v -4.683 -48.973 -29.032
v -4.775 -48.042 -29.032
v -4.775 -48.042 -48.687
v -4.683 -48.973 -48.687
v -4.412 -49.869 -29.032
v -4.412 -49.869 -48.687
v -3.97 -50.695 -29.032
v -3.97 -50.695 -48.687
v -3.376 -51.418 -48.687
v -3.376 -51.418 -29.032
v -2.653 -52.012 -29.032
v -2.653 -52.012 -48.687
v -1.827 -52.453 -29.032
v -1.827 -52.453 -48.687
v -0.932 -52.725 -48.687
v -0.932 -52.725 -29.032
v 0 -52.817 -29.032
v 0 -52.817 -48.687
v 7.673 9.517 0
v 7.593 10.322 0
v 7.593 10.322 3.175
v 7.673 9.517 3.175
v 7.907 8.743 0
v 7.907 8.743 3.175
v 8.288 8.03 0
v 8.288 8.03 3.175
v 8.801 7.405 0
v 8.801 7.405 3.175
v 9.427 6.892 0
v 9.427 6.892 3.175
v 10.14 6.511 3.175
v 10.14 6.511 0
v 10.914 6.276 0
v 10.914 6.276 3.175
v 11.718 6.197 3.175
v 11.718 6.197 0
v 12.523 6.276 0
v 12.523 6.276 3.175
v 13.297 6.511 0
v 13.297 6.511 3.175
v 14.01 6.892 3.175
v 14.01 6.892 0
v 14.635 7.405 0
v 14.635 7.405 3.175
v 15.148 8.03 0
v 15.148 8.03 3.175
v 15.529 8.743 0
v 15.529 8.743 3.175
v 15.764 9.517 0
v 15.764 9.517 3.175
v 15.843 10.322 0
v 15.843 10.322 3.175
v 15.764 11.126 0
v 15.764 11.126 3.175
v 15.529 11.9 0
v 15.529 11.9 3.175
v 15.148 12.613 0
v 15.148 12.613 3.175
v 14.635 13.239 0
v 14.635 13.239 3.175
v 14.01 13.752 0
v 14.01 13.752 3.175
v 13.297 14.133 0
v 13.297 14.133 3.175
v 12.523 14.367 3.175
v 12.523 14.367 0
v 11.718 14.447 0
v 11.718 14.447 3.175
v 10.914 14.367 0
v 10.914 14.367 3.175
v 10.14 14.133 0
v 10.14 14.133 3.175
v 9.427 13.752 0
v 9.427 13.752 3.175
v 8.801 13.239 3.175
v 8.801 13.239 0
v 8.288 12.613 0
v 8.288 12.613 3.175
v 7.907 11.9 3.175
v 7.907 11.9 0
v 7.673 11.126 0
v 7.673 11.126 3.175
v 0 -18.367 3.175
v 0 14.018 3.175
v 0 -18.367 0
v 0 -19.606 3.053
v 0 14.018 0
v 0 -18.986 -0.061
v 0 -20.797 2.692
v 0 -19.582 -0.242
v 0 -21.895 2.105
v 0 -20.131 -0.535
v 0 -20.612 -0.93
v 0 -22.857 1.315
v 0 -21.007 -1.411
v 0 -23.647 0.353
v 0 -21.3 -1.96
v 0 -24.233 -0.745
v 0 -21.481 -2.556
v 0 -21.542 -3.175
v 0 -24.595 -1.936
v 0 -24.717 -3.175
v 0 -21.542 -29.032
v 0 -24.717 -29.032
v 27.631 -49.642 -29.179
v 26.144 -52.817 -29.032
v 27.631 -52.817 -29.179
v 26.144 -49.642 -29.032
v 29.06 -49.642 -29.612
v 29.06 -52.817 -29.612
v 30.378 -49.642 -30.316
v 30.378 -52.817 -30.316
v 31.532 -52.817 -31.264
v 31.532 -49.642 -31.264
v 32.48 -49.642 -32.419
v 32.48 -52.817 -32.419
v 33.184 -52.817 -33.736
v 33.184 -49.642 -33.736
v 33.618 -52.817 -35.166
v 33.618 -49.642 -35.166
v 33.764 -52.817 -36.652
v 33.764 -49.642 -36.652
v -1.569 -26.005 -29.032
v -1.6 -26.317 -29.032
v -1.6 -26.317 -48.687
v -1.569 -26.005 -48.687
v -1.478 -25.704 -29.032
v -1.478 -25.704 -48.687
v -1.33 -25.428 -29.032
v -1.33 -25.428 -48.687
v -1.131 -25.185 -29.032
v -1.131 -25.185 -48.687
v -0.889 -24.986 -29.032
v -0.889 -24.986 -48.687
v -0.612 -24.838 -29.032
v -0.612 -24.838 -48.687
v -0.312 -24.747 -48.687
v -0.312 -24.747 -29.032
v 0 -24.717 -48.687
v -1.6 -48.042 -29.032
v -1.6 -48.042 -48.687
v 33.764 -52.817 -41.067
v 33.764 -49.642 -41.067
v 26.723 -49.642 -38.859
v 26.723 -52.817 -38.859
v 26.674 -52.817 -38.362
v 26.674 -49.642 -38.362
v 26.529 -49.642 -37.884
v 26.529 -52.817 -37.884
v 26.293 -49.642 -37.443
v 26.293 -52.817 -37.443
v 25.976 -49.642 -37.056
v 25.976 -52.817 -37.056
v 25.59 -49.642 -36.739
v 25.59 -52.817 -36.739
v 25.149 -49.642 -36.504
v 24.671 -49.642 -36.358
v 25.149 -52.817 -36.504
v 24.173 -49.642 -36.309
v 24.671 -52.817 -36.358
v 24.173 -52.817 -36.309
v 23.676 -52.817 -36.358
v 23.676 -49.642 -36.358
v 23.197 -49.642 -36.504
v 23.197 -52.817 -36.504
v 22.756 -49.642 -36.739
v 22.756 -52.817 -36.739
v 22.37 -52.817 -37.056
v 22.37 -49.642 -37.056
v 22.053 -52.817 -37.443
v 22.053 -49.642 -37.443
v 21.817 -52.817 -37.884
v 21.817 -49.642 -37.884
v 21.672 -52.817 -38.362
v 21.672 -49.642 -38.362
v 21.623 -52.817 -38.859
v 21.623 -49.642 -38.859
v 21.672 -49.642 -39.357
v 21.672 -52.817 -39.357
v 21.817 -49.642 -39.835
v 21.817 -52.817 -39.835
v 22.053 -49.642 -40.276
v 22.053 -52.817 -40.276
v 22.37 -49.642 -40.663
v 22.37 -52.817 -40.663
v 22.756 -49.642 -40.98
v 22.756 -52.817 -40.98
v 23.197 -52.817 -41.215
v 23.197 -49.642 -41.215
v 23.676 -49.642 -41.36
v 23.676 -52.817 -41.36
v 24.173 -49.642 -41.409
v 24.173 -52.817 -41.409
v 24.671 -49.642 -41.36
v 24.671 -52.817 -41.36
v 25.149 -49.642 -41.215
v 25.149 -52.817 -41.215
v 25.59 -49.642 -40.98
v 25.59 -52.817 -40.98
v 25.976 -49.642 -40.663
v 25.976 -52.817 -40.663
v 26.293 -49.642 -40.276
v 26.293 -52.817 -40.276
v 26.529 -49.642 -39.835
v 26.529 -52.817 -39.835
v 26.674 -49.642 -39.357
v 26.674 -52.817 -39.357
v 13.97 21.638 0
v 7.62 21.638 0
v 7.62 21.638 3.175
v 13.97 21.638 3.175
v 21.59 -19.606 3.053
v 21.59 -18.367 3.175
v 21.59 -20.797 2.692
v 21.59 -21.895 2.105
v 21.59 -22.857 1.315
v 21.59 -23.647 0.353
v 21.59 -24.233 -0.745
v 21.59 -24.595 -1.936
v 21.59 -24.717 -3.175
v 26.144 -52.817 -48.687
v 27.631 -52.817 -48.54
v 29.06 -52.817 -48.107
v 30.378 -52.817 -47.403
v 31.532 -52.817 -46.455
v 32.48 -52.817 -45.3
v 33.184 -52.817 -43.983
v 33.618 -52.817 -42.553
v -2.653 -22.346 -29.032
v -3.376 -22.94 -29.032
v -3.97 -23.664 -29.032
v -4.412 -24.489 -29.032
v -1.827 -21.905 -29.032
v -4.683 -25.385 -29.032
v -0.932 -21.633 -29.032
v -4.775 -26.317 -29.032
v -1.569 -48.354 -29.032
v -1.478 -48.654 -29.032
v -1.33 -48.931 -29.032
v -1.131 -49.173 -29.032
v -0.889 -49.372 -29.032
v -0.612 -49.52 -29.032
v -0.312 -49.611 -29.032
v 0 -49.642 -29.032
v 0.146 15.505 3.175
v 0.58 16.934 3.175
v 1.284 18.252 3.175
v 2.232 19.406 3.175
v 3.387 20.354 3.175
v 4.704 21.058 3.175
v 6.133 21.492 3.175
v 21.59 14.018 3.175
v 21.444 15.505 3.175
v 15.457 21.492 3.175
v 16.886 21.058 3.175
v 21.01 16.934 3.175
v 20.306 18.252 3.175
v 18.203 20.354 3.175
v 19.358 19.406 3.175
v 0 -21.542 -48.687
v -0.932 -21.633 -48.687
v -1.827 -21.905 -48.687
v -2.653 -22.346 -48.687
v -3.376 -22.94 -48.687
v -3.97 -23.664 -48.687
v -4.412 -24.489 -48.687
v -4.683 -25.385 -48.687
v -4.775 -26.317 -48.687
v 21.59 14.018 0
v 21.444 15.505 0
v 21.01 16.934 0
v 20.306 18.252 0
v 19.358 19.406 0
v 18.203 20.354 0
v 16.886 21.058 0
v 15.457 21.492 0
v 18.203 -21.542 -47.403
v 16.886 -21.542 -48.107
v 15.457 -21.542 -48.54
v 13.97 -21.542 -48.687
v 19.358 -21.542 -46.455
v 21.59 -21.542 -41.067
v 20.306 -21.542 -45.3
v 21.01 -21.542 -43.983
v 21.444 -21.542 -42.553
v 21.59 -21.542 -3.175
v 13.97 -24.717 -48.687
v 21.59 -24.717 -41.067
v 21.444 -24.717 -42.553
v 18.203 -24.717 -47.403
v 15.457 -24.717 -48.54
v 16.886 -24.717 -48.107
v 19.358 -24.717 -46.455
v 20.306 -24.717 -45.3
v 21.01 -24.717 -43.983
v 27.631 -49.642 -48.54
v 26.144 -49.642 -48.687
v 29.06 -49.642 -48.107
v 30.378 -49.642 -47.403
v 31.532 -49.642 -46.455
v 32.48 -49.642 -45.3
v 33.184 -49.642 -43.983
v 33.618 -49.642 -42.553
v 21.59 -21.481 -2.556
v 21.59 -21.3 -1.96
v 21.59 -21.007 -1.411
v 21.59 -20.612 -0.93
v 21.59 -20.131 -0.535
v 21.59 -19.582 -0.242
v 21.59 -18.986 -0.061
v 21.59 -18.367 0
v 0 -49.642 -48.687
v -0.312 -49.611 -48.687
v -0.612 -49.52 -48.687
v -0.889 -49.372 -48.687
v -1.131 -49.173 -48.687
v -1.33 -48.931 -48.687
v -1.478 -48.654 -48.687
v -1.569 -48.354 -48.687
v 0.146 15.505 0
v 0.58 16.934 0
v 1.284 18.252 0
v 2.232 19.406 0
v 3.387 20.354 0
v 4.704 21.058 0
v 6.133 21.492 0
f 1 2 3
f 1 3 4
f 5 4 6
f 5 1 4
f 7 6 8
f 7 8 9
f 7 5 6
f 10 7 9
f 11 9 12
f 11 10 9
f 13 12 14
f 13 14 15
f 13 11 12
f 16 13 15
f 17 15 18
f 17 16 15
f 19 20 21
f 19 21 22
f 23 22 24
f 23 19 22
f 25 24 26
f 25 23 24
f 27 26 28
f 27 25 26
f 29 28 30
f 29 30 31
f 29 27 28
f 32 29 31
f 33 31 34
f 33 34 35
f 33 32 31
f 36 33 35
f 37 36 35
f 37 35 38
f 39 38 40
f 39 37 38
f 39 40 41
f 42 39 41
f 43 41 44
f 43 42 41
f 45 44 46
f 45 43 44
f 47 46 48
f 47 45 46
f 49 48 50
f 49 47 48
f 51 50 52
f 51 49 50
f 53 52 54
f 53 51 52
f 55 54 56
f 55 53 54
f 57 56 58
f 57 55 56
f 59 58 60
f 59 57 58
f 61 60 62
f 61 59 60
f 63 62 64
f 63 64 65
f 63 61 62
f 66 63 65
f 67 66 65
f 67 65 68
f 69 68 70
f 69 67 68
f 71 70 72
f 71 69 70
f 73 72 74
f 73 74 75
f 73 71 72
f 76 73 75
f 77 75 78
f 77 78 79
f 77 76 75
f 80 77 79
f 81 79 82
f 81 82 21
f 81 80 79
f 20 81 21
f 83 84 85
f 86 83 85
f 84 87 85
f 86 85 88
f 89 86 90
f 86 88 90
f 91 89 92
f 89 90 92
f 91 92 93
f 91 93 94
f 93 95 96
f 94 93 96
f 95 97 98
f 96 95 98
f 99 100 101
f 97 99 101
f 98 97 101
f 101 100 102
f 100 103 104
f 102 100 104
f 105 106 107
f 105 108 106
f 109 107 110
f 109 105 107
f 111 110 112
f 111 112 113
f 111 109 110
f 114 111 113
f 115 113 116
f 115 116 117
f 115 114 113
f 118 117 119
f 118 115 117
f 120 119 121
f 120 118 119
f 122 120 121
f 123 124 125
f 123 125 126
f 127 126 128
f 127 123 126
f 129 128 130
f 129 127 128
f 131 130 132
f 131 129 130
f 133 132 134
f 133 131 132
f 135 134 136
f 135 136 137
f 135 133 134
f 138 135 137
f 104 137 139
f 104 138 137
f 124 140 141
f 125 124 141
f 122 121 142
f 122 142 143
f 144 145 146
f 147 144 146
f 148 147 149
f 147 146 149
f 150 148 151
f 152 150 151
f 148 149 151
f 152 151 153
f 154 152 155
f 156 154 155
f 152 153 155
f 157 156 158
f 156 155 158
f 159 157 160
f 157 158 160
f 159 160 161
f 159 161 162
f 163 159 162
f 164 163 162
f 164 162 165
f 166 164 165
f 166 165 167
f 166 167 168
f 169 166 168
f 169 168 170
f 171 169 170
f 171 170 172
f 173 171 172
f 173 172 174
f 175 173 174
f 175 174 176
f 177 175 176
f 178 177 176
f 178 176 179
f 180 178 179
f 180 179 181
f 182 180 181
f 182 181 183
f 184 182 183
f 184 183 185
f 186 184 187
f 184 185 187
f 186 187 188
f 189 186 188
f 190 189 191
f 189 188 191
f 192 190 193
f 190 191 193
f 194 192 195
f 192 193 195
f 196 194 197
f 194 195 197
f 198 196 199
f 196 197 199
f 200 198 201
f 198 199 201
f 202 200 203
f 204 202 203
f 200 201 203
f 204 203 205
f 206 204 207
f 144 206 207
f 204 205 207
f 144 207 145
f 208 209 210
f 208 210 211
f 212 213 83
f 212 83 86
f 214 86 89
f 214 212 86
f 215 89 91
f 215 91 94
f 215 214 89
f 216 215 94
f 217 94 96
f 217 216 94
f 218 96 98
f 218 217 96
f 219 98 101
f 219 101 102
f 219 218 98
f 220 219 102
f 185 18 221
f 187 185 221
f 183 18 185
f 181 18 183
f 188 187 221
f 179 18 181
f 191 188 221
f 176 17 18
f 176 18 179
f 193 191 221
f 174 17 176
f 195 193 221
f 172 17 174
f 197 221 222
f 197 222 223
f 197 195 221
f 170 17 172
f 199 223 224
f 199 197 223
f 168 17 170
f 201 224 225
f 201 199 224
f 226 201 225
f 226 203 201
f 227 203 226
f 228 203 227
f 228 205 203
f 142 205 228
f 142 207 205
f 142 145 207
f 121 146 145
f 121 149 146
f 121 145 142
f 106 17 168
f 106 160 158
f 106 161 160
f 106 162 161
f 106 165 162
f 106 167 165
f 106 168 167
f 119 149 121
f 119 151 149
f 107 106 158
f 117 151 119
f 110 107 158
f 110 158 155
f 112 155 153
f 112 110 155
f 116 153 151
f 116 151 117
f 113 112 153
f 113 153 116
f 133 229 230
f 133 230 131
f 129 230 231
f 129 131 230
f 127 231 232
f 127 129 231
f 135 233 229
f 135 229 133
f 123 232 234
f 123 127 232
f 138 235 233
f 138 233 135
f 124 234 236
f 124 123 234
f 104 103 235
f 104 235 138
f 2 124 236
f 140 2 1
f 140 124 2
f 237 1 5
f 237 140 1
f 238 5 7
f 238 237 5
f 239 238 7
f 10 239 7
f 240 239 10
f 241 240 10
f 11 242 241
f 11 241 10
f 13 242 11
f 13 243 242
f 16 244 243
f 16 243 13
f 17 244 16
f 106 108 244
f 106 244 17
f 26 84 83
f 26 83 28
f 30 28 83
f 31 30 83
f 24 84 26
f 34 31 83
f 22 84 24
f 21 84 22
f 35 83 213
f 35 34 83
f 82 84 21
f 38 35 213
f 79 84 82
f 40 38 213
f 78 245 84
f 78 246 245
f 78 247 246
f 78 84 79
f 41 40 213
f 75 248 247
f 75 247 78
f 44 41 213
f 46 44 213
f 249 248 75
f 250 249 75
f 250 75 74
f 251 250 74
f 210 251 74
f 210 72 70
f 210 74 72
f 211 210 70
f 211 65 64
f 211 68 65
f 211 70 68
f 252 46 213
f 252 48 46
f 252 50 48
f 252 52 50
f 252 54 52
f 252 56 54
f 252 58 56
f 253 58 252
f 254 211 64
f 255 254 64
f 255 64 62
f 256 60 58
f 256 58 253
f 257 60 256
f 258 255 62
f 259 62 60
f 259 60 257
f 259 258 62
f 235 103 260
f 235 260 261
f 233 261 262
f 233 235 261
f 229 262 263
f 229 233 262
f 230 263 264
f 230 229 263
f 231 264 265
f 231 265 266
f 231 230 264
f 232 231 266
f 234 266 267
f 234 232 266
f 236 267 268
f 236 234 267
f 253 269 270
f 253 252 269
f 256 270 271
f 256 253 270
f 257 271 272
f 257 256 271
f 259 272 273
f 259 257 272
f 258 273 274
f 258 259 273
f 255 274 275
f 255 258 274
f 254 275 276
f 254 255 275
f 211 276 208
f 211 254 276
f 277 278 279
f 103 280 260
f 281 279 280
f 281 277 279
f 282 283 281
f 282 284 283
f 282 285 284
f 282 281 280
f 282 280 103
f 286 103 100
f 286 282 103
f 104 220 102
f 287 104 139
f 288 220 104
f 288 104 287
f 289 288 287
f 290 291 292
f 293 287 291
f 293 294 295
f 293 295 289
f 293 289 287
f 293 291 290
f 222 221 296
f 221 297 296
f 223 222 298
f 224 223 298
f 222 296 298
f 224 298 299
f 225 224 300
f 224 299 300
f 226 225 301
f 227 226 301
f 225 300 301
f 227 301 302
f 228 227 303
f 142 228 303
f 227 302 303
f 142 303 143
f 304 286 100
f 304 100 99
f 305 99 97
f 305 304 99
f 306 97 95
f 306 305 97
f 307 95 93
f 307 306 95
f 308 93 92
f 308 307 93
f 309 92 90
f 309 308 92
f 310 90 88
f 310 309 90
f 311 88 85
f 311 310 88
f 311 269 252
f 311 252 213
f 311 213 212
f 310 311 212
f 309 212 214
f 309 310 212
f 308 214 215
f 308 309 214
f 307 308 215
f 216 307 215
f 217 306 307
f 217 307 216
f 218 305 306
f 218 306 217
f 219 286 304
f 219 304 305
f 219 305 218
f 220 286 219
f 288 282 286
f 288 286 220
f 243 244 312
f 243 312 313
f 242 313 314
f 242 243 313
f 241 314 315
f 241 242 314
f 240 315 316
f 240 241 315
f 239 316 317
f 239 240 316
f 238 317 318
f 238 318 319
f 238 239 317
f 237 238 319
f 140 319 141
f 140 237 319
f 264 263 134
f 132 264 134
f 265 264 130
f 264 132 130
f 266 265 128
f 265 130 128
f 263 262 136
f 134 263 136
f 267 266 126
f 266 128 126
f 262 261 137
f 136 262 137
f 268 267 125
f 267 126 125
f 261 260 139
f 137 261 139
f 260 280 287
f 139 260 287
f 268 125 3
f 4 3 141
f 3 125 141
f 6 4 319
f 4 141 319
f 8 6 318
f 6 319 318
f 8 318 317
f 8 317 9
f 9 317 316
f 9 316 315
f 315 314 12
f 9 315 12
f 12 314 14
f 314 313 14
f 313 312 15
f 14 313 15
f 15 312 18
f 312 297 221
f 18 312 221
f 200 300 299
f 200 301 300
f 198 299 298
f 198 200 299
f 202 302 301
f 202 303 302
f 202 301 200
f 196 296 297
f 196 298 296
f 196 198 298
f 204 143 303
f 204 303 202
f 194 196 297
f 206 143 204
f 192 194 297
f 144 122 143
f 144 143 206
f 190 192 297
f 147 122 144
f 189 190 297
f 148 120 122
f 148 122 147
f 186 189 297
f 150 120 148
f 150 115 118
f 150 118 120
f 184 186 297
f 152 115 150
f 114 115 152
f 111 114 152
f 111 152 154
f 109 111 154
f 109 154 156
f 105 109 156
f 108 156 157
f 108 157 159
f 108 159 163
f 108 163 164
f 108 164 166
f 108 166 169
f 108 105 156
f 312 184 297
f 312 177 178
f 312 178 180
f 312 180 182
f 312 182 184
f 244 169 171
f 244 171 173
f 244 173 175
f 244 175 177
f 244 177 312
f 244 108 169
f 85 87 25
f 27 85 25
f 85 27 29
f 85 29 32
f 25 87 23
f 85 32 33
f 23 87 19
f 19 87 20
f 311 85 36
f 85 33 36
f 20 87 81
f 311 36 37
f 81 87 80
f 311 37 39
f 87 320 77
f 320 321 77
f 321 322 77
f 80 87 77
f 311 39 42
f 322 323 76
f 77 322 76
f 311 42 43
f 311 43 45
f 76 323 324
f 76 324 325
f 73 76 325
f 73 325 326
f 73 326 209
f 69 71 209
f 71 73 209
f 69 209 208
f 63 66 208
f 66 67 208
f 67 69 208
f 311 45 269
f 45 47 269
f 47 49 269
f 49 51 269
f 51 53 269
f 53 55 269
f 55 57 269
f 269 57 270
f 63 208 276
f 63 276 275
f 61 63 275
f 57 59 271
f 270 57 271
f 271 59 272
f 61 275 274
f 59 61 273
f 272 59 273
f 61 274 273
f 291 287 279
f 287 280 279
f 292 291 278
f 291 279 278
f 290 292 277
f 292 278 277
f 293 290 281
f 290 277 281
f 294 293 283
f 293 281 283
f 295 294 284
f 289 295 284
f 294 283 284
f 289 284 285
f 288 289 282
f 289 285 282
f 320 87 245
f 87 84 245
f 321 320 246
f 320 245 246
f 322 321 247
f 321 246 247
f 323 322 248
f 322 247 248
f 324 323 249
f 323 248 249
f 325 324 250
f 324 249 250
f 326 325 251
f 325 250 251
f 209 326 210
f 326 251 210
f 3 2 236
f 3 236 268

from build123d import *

# Parameters (mm, degrees)
SKETCH1_W                    = 21.59
SKETCH1_H                    = 43.18
SKETCH1_R                    = 4.124999878
BOSS_EXTRUDE1_DEPTH          = 3.175
EDGE_FLANGE1_STRIP_W         = 19.05
EDGE_FLANGE1_STRIP_H         = 3.175
EDGE_FLANGE1_STRIP_CUT_DEPTH = 21.59
EDGE_FLANGE1_DEPTH           = 21.59
EDGE_FLANGE2_DEPTH           = 19.65452
EDGE_FLANGE2_START           = 3.175
EDGE_FLANGE2_FLAT_DEPTH      = 3.175
EDGE_FLANGE3_STRIP_W         = 15.900000204
EDGE_FLANGE3_STRIP_H         = 3.175
EDGE_FLANGE3_STRIP_CUT_DEPTH = 19.65452
EDGE_FLANGE3_DEPTH           = 19.65452
CUT_EXTRUDE2_REACH           = 97.152
SKETCH11_R                   = 2.55
FILLET1_R                    = 7.62


# Sheet-metal steps are written as plain solids
with BuildPart() as part:
    # Sketch1 → Boss-Extrude1 (new body)
    with BuildSketch(Plane.XY):
        with Locations((10.795, 0.048317484)):
            Rectangle(SKETCH1_W, SKETCH1_H)
        with Locations(Location((11.7183, 10.32174739, 0), (0, 0, 180))):
            Circle(SKETCH1_R, mode=Mode.SUBTRACT)
    extrude(amount=BOSS_EXTRUDE1_DEPTH)

    # Edge-Flange1: sheet metal written as solids
    # Edge-Flange1 strip (on a plane across the edge) → Edge-Flange1 strip cut (cut)
    with BuildSketch(Plane(origin=(21.59, -21.541682516, 0), x_dir=(0, 1, 0), z_dir=(-1, 0, 0))):
        with Locations((-6.35, -1.5875)):
            Rectangle(EDGE_FLANGE1_STRIP_W, EDGE_FLANGE1_STRIP_H)
    extrude(amount=EDGE_FLANGE1_STRIP_CUT_DEPTH, mode=Mode.SUBTRACT)

    # Edge-Flange1 section (on a plane across the edge) → Edge-Flange1 (add)
    with BuildSketch(Plane(origin=(21.59, -21.541682516, 0), x_dir=(0, 1, 0), z_dir=(-1, 0, 0))):
        with BuildLine():
            Line((-3.175, 3.175), (-3.175, 48.68672))
            Line((-3.175, 48.68672), (0, 48.68672))
            Line((0, 48.68672), (0, 3.175))
            ThreePointArc((0, 3.175), (0.92993597, 0.92993597), (3.175, 0))
            Line((3.175, 0), (3.175, -3.175))
            ThreePointArc((3.175, -3.175), (-1.315128061, -1.315128061), (-3.175, 3.175))
        make_face()
    extrude(amount=EDGE_FLANGE1_DEPTH)

    # Edge-Flange2: sheet metal written as solids
    # Edge-Flange2 bend section (on a plane across the edge) → Edge-Flange2 (add)
    with BuildSketch(Plane(origin=(-1.600000102, -24.716682516, -29.0322), x_dir=(1, 0, 0), z_dir=(0, 0, -1))):
        with BuildLine():
            Line((-3.175, 1.600000102), (0, 1.600000102))
            ThreePointArc((0, 1.600000102), (0.46862918, 0.46862918), (1.600000102, 0))
            Line((1.600000102, 0), (1.600000102, -3.175))
            ThreePointArc((1.600000102, -3.175), (-1.77643485, -1.77643485), (-3.175, 1.600000102))
        make_face()
    extrude(amount=EDGE_FLANGE2_DEPTH)

    # Edge-Flange2 profile (on flange) → Edge-Flange2 flat (add)
    with BuildSketch(Plane(origin=(-1.600000102, -24.716682516, 0), x_dir=(0, 0, -1), z_dir=(-1, 0, 0)).offset(EDGE_FLANGE2_START)):
        Polygon((29.0322, 28.10002), (29.0322, 19.3675), (29.0322, 1.600000102), (48.68672, 1.600000102), (48.68672, 28.10002), align=None)
    extrude(amount=-EDGE_FLANGE2_FLAT_DEPTH)

    # Edge-Flange3: sheet metal written as solids
    # Edge-Flange3 strip (on a plane across the edge) → Edge-Flange3 strip cut (cut)
    with BuildSketch(Plane(origin=(-1.600000102, -52.816702516, -29.0322), x_dir=(0, 1, 0), z_dir=(0, 0, -1))):
        with Locations((-3.175, -1.5875)):
            Rectangle(EDGE_FLANGE3_STRIP_W, EDGE_FLANGE3_STRIP_H)
    extrude(amount=EDGE_FLANGE3_STRIP_CUT_DEPTH, mode=Mode.SUBTRACT)

    # Edge-Flange3 section (on a plane across the edge) → Edge-Flange3 (add)
    with BuildSketch(Plane(origin=(-1.600000102, -52.816702516, -29.0322), x_dir=(0, 1, 0), z_dir=(0, 0, -1))):
        with BuildLine():
            Line((0, 1.600000102), (0, 35.364220102))
            Line((0, 35.364220102), (3.175, 35.364220102))
            Line((3.175, 35.364220102), (3.175, 1.600000102))
            ThreePointArc((3.175, 1.600000102), (3.64362918, 0.46862918), (4.775000102, 0))
            Line((4.775000102, 0), (4.775000102, -3.175))
            ThreePointArc((4.775000102, -3.175), (1.39856515, -1.77643485), (0, 1.600000102))
        make_face()
    extrude(amount=EDGE_FLANGE3_DEPTH)

    # Sketch11 → Cut-Extrude2 (cut, up to next)
    with BuildSketch(Plane.XZ.offset(52.816702516), mode=Mode.PRIVATE) as cut_extrude2_sk1:
        with Locations((24.17318, -38.85946)):
            Circle(SKETCH11_R)
    cut_extrude2_tool1 = extrude(cut_extrude2_sk1.sketch, amount=-CUT_EXTRUDE2_REACH, mode=Mode.PRIVATE) & part.part
    add(cut_extrude2_tool1.solids().sort_by_distance((24.17318, -52.816703, -38.85946))[0], mode=Mode.SUBTRACT)

    # Fillet1
    fillet1_edges = [part.edges().sort_by_distance(p)[0] for p in [
        (0, 21.638317484, 1.5875),
        (21.59, 21.638317484, 1.5875),
        (21.59, -23.129182516, -48.68672),
        (33.76422, -51.229202516, -29.0322),
        (33.76422, -51.229202516, -48.68672),
    ]]
    fillet(fillet1_edges, radius=FILLET1_R)


solid = part.part
